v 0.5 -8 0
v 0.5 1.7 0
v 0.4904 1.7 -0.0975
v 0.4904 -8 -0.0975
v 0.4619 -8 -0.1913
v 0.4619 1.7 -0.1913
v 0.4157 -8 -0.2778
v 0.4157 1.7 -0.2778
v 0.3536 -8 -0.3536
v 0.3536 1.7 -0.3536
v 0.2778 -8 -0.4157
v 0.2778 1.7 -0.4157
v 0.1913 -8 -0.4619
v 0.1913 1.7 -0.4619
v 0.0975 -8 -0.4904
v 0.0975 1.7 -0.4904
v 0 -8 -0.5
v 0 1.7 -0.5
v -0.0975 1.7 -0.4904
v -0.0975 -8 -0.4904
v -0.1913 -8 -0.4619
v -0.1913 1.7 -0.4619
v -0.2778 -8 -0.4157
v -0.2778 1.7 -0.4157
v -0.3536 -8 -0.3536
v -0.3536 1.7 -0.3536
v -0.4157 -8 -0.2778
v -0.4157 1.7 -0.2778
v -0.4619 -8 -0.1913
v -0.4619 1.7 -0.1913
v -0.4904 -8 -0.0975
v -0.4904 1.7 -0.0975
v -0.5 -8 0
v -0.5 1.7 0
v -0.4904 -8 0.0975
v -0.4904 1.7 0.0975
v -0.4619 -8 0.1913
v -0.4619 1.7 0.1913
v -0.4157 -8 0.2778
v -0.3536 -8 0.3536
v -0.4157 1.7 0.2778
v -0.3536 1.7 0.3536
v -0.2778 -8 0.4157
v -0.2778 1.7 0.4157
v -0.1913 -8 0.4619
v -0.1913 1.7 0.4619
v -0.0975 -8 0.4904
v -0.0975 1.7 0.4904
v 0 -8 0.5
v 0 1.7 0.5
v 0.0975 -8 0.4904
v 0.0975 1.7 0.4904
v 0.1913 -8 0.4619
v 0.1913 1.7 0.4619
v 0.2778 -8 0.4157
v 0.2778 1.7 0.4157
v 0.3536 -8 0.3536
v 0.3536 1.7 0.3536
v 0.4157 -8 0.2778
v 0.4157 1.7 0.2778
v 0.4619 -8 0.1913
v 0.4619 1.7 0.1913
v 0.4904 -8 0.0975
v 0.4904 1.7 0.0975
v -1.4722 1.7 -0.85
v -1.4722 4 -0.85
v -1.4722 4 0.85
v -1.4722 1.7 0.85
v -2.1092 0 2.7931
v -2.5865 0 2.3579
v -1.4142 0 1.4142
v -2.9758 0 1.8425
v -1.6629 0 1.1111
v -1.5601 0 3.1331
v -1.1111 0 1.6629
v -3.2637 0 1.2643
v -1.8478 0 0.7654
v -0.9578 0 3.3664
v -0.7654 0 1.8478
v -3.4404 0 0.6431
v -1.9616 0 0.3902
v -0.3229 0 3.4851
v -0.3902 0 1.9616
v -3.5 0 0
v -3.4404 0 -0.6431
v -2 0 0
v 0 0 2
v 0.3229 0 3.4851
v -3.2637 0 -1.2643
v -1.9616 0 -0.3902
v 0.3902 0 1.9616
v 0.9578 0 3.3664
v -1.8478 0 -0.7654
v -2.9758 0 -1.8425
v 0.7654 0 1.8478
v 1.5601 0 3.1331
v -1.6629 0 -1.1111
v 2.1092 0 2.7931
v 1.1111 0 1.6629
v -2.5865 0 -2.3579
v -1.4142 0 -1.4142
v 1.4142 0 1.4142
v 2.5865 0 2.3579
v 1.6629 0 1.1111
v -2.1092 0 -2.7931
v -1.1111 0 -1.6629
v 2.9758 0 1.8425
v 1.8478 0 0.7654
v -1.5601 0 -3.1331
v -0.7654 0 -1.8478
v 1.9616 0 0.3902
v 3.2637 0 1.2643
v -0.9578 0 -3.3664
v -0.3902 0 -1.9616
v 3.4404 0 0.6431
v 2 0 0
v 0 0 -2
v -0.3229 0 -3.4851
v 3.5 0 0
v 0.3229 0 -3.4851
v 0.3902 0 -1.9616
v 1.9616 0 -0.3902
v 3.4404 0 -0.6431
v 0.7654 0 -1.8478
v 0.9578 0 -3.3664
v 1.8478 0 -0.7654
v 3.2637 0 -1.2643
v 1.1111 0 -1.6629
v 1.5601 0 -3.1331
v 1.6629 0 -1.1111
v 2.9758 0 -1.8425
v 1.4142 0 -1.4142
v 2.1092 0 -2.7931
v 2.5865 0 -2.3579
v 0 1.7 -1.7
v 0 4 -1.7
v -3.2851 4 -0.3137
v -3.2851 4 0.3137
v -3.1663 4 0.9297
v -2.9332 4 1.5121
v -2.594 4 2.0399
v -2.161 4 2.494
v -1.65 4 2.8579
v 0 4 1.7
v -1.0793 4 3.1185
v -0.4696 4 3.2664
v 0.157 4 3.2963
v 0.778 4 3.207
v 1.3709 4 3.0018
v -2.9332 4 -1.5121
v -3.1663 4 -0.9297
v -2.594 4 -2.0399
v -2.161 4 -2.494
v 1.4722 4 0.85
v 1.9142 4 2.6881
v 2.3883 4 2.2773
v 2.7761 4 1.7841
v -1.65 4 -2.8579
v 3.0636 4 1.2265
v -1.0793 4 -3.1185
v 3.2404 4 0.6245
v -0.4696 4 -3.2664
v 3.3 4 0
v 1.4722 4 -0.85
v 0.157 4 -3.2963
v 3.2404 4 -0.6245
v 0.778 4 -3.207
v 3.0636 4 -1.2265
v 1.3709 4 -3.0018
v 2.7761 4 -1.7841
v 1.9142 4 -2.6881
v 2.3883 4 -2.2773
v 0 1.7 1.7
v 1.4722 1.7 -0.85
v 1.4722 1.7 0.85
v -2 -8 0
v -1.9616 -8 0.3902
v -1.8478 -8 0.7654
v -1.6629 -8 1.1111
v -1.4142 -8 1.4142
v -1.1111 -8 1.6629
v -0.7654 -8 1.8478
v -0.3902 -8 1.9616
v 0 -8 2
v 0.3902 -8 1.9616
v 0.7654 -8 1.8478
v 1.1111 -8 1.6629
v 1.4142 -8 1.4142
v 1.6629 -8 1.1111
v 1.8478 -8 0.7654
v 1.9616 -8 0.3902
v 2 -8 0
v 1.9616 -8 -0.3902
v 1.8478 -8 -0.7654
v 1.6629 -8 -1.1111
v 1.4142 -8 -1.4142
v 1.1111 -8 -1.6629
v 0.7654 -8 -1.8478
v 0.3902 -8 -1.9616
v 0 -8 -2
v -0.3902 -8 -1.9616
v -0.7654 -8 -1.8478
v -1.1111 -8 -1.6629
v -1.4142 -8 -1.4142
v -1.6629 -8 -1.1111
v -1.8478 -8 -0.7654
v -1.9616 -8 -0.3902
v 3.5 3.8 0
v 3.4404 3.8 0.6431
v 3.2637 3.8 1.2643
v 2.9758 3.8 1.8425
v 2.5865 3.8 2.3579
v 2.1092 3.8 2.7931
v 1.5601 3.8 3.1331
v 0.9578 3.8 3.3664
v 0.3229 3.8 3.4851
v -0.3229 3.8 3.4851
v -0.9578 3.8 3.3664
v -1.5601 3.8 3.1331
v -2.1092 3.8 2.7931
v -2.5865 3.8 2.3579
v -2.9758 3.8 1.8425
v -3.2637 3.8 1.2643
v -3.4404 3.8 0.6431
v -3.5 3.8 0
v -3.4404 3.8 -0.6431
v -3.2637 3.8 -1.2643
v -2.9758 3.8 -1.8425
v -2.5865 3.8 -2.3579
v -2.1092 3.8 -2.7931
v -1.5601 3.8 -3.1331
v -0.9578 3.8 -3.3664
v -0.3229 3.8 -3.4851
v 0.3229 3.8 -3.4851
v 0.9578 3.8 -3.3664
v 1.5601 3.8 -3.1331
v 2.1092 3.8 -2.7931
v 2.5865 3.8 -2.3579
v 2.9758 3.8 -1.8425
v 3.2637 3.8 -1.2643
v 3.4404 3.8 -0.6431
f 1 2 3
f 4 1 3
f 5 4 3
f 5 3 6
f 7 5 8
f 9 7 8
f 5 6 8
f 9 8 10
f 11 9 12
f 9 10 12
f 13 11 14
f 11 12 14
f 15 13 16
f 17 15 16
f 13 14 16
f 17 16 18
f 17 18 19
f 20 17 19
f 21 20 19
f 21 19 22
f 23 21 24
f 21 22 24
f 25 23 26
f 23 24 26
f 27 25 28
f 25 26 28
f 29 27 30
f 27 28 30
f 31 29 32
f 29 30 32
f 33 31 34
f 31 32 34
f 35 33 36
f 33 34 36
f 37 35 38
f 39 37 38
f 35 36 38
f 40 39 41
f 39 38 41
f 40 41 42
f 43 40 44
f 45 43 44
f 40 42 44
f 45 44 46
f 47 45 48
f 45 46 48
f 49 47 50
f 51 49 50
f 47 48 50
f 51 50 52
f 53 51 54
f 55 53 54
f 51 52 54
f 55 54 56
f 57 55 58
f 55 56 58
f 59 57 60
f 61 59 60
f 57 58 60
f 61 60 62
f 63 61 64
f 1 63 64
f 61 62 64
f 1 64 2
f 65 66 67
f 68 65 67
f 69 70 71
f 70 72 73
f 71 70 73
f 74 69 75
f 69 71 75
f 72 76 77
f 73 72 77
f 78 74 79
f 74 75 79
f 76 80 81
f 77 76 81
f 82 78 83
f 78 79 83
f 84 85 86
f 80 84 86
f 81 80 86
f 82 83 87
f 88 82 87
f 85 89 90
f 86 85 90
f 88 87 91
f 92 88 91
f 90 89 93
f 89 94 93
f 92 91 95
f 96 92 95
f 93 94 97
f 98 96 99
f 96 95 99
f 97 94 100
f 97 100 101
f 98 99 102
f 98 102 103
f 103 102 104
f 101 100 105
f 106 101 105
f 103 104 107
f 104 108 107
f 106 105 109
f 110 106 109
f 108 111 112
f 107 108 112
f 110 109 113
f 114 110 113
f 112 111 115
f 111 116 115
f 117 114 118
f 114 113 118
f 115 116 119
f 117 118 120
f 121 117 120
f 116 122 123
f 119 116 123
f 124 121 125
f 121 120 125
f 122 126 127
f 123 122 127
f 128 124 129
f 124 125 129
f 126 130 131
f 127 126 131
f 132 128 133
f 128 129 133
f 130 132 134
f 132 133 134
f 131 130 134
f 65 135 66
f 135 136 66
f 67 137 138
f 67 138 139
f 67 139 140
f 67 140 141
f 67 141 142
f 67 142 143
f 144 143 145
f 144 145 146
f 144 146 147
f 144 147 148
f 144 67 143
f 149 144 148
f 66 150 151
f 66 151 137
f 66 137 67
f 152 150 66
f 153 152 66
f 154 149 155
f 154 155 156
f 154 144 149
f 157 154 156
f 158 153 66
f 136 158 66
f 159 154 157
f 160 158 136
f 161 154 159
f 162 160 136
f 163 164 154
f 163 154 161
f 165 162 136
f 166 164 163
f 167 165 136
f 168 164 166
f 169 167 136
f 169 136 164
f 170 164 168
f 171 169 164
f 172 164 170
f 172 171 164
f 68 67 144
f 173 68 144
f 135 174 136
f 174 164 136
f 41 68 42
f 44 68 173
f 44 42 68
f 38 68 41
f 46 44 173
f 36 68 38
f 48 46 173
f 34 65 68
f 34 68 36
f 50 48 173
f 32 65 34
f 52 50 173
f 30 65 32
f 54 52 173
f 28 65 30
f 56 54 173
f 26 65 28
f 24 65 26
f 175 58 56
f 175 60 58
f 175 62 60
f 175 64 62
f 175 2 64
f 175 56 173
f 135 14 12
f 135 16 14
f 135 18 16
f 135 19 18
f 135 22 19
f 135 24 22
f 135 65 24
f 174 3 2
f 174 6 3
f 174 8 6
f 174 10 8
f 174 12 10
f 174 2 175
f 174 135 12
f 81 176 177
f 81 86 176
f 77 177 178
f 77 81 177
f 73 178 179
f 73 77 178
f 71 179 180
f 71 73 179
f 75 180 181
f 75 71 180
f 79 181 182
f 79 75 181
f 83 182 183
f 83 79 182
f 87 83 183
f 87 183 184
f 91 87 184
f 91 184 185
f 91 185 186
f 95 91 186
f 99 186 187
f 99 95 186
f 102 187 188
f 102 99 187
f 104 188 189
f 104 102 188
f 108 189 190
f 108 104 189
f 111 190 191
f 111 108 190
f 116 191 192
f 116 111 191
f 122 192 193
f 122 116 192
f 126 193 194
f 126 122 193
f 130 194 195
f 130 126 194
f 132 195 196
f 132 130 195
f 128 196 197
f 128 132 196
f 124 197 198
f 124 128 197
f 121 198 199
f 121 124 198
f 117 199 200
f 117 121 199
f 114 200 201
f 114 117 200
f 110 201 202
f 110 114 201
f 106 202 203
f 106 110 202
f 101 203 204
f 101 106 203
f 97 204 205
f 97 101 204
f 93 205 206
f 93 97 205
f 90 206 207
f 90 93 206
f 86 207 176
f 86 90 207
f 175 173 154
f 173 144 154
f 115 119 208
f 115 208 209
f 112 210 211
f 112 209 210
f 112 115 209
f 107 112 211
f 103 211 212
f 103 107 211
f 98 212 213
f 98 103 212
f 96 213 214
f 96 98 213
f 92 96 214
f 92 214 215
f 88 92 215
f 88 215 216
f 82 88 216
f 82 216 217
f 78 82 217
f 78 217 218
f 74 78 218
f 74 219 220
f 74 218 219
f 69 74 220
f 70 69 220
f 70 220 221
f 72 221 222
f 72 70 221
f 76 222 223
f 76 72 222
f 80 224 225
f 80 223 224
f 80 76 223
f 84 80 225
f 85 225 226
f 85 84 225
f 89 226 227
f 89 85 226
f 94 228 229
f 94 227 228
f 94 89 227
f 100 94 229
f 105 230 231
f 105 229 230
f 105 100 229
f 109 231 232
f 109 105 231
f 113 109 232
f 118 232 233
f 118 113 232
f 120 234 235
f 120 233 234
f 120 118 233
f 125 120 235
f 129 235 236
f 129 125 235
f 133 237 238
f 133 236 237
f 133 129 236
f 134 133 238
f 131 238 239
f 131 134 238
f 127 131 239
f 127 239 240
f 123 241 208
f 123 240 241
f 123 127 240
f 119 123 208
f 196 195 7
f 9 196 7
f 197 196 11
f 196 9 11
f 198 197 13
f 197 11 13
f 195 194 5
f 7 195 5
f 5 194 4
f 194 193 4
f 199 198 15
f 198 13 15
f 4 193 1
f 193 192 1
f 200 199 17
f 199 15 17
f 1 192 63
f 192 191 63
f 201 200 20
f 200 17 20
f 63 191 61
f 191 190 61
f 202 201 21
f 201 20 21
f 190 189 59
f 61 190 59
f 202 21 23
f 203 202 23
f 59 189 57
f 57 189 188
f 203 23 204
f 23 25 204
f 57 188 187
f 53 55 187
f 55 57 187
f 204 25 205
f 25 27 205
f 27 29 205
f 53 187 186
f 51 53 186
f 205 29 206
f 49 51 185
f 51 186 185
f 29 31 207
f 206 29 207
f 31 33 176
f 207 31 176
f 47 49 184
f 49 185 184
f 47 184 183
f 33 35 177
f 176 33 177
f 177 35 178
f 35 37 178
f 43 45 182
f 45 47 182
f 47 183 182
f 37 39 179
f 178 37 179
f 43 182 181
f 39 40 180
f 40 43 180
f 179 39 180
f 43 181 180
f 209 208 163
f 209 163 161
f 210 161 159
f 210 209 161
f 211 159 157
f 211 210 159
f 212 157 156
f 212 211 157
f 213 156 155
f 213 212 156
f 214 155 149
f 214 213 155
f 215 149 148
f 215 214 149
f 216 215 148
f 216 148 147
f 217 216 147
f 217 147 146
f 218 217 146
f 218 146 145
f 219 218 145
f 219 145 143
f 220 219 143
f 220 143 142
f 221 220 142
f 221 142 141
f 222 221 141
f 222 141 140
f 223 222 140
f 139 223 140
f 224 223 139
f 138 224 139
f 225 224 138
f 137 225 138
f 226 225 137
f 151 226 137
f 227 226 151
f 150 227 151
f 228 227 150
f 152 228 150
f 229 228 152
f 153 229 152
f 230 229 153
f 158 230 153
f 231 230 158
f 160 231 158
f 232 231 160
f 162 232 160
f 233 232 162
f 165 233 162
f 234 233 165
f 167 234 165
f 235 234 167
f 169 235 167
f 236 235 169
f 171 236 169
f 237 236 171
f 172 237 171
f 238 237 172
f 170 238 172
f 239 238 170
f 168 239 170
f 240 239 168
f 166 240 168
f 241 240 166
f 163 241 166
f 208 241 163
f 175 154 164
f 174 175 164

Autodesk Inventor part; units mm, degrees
ref_plane "YZ Plane" through (0, 0, 0) normal (1, 0, 0) x (0, 1, 0)
ref_plane "XZ Plane" through (0, 0, 0) normal (0, 1, 0) x (-1, 0, 0)
ref_plane "XY Plane" through (0, 0, 0) normal (0, 0, 1) x (1, 0, 0)
sketch "スケッチ1" plane through (0, 0, 0) normal (0, 1, 0) x (-1, 0, 0)
  circle A0 centre (0, 0) radius 2
  dimension "d0" = 4
extrude "押し出し1" add sketch "スケッチ1" against normal blind 8
sketch "スケッチ2" plane through (0, 0, 0) normal (0, 1, 0) x (1, 0, 0)
  circle A0 centre (0, 0) radius 2 projected
  circle A1 centre (0, 0) radius 3.5
  dimension "d3" = 7
extrude "押し出し2" add sketch "スケッチ2" along normal blind 4 contours A0 | A1
sketch "スケッチ3" plane through (0, 4, 0) normal (0, 1, 0) x (1, 0, 0)
  circle A0 centre (0, 0) radius 1.7 construction
  line L0 (0, 1.7) -> (-1.4722, 0.85)
  line L1 (-1.4722, 0.85) -> (-1.4722, -0.85)
  line L2 (-1.4722, -0.85) -> (0, -1.7)
  line L3 (0, -1.7) -> (1.4722, -0.85)
  line L4 (1.4722, -0.85) -> (1.4722, 0.85)
  line L5 (1.4722, 0.85) -> (0, 1.7)
  dimension "d6" = 3.4
  dimension "d9" = 360
extrude "押し出し3" cut sketch "スケッチ3" against normal blind 2.3
chamfer "面取り1" distance 0.2 angle 45 1 edges at (-3.5, 4, 0)
thread "ねじ1" size "M4x0.7" class "6g" standard "ANSI Metric M Profile" full length
sketch "スケッチ4" plane through (0, 1.7, 0) normal (0, 1, 0) x (1, 0, 0)
  circle A0 centre (0, 0) radius 0.5
  dimension "d18" = 1
extrude "押し出し4" cut sketch "スケッチ4" against normal through all
properties part number "M4×8-VentedHexSocket" material "ステンレス鋼"
